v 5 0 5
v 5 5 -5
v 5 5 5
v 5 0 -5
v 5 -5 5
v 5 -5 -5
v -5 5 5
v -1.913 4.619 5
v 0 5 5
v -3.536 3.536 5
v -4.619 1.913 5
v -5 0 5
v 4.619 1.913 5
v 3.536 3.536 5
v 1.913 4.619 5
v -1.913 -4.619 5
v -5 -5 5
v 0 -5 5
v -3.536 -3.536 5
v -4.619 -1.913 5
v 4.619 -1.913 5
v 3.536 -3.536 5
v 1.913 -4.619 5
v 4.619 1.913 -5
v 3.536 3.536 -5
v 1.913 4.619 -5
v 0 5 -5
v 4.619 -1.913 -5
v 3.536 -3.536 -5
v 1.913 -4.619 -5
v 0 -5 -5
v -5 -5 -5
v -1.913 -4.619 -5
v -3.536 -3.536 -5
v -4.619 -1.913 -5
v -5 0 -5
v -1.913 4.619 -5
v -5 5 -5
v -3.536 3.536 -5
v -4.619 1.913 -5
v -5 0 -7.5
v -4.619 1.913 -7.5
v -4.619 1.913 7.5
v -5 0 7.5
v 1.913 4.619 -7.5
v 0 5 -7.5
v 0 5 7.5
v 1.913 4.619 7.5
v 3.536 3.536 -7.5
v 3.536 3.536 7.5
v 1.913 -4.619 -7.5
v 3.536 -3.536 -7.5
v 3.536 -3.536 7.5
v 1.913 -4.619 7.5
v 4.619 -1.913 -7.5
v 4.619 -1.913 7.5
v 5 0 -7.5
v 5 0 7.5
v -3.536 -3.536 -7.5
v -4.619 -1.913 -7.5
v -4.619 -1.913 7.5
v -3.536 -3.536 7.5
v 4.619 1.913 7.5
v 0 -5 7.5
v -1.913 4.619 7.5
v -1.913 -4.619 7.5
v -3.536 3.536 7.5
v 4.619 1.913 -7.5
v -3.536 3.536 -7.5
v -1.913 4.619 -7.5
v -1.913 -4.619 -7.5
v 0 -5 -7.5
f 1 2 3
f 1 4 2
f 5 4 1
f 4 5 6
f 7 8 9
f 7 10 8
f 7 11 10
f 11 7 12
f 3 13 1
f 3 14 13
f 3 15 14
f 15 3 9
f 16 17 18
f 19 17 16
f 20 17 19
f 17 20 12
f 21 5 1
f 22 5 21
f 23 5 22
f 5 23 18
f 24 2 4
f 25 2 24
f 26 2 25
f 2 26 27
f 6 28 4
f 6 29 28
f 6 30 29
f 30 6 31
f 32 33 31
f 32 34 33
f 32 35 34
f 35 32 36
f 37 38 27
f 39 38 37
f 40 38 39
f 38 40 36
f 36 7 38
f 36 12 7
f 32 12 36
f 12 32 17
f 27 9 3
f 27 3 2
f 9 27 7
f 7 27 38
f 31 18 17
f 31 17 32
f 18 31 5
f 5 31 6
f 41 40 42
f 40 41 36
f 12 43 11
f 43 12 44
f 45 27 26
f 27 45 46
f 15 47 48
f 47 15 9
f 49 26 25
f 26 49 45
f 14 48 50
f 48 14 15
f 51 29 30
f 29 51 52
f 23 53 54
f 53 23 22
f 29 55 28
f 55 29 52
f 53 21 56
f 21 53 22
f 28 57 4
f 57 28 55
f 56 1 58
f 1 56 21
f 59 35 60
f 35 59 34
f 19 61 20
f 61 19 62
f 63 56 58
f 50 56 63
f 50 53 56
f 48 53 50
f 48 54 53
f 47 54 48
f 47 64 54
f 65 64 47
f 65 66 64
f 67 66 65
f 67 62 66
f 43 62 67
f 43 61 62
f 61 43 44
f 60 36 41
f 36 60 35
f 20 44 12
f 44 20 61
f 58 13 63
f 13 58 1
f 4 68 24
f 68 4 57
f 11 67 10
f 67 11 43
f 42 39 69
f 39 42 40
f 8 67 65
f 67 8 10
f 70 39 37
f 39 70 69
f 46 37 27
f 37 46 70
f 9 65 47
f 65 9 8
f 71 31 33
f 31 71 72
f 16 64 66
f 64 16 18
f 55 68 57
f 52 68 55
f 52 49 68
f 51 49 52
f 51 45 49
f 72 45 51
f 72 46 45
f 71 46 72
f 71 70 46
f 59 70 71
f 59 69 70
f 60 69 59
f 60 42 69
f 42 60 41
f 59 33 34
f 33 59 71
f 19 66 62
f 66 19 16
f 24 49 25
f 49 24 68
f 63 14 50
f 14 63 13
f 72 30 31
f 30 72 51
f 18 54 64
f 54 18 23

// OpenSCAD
// Size of the Cube (all directions)
cuSize = 10;

// The diameter of the Cylinder
cyDia = 10;

// The height of the Cylinder
cyHei = 15;

// Z-Rotation of the Cylinder
rZ = 45;

// Create Cube and rotate Cylinder by 'rZ'
cube(size = [cuSize, cuSize, cuSize], center = true);
rotate([0, 0, rZ])
    cylinder(d = cyDia, h = cyHei, center = true);
